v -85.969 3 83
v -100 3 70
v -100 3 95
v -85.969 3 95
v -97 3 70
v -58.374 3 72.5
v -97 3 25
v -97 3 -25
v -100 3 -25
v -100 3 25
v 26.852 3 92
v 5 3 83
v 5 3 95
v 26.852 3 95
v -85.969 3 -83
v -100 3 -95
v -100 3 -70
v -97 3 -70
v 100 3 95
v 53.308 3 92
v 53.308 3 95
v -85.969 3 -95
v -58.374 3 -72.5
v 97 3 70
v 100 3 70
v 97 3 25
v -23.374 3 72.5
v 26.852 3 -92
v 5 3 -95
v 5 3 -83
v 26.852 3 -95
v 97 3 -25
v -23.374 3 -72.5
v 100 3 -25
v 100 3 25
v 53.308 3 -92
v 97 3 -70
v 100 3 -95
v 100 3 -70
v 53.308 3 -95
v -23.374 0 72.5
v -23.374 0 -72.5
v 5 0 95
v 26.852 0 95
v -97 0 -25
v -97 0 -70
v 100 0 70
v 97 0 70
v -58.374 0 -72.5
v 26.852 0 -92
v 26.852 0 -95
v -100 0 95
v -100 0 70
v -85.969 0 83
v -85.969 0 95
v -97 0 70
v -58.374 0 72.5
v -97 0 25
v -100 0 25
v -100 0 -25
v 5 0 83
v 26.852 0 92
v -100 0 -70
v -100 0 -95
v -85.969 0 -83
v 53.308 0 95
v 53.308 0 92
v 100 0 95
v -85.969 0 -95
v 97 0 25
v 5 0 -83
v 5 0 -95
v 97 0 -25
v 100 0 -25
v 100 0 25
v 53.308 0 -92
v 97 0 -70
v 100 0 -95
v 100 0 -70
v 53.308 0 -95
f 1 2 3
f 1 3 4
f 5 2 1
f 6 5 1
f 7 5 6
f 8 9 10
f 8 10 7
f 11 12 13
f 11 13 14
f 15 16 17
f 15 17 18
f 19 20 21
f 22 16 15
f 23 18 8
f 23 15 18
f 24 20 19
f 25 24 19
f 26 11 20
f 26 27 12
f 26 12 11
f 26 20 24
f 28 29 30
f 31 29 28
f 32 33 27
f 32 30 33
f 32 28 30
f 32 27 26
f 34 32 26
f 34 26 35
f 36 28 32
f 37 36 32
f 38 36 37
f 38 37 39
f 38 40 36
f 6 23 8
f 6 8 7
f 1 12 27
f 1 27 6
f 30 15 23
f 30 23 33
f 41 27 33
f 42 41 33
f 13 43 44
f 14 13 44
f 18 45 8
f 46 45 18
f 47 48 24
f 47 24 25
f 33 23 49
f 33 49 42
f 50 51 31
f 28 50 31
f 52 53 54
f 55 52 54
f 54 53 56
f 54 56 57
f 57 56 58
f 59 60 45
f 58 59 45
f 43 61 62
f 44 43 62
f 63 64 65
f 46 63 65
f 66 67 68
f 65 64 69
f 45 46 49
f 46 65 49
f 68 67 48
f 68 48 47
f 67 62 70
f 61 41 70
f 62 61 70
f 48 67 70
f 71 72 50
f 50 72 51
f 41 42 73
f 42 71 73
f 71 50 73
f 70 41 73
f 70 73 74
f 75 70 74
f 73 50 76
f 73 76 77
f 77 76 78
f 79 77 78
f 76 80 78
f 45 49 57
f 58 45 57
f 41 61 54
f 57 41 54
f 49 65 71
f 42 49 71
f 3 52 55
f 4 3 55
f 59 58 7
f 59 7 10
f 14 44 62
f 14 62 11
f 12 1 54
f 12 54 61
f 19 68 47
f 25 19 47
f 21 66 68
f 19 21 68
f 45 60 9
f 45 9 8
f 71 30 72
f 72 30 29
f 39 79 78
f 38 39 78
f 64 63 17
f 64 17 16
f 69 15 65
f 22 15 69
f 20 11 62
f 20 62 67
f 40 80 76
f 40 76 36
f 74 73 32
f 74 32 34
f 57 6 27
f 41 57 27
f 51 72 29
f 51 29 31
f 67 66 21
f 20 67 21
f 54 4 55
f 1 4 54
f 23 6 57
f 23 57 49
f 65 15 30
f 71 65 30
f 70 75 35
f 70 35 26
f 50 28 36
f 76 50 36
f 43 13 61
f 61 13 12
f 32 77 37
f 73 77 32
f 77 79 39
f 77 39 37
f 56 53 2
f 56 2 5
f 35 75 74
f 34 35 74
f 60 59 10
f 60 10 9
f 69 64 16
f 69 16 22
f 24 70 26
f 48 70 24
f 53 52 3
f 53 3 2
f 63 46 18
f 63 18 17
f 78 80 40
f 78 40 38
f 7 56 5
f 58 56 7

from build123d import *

# Parameters (mm, degrees)
SKETCH1_W               = 200
SKETCH1_H               = 190
BOSS_EXTRUDE1_DEPTH     = 3
CUT_EXTRUDE2_DEPTH      = 138.963763358
CUT_EXTRUDE2_DEPTH_BACK = 3
SKETCH2_OUTSIDE_W       = 257.176
SKETCH2_OUTSIDE_H       = 247.176
SKETCH3_W               = 35
SKETCH3_H               = 145
CUT_EXTRUDE3_DEPTH      = 3
SKETCH4_W               = 90.968696296
SKETCH4_H               = 12
CUT_EXTRUDE4_DEPTH      = 3
SKETCH6_W               = 26.456316212
SKETCH6_H               = 3
CUT_EXTRUDE5_DEPTH      = 3


with BuildPart() as part:
    # Sketch1 → Boss-Extrude1 (new body)
    with BuildSketch(Plane(origin=(0, 0, 0), x_dir=(1, 0, 0), z_dir=(0, 1, 0))):
        Rectangle(SKETCH1_W, SKETCH1_H)
    extrude(amount=BOSS_EXTRUDE1_DEPTH)

    # Sketch2 outside → Cut-Extrude2 (cut, two sides: drawn at the far end of the back side and taken through both)
    with BuildSketch(Plane(origin=(0, 3, 0), x_dir=(1, 0, 0), z_dir=(0, 1, 0)).offset(-CUT_EXTRUDE2_DEPTH_BACK)):
        Rectangle(SKETCH2_OUTSIDE_W, SKETCH2_OUTSIDE_H)
        Polygon((-100, -95), (-100, -70), (-97, -70), (-97, -25), (-100, -25), (-100, 25), (-97, 25), (-97, 70), (-100, 70), (-100, 95), (100, 95), (100, 70), (97, 70), (97, 25), (100, 25), (100, -25), (97, -25), (97, -70), (100, -70), (100, -95), align=None, mode=Mode.SUBTRACT)
    extrude(amount=CUT_EXTRUDE2_DEPTH + CUT_EXTRUDE2_DEPTH_BACK, mode=Mode.SUBTRACT)

    # Sketch3 → Cut-Extrude3 (cut)
    with BuildSketch(Plane(origin=(0, 3, 0), x_dir=(1, 0, 0), z_dir=(0, 1, 0))):
        with Locations((-40.873559806, 0)):
            Rectangle(SKETCH3_W, SKETCH3_H)
    extrude(amount=-CUT_EXTRUDE3_DEPTH, mode=Mode.SUBTRACT)

    # Sketch4 → Cut-Extrude4 (cut)
    with BuildSketch(Plane(origin=(0, 3, 0), x_dir=(1, 0, 0), z_dir=(0, 1, 0))):
        with Locations((-40.484348148, 89)):
            Rectangle(SKETCH4_W, SKETCH4_H)
        with Locations((-40.484348148, -89)):
            Rectangle(SKETCH4_W, SKETCH4_H)
    extrude(amount=-CUT_EXTRUDE4_DEPTH, mode=Mode.SUBTRACT)

    # Sketch6 → Cut-Extrude5 (cut)
    with BuildSketch(Plane.XY.offset(95)):
        with Locations((40.079944256, 1.5)):
            Rectangle(SKETCH6_W, SKETCH6_H)
        Polygon((28.711773307, -23.399830076), (27.78877695, -20.614939543), (57.834413552, -10.656913259), (58.805651465, -13.58735957), align=None)
    cut_extrude5 = extrude(amount=-CUT_EXTRUDE5_DEPTH, mode=Mode.SUBTRACT)

    # Mirror1: Cut-Extrude5 across plane
    add(cut_extrude5.mirror(Plane.XY), mode=Mode.SUBTRACT)


solid = part.part
